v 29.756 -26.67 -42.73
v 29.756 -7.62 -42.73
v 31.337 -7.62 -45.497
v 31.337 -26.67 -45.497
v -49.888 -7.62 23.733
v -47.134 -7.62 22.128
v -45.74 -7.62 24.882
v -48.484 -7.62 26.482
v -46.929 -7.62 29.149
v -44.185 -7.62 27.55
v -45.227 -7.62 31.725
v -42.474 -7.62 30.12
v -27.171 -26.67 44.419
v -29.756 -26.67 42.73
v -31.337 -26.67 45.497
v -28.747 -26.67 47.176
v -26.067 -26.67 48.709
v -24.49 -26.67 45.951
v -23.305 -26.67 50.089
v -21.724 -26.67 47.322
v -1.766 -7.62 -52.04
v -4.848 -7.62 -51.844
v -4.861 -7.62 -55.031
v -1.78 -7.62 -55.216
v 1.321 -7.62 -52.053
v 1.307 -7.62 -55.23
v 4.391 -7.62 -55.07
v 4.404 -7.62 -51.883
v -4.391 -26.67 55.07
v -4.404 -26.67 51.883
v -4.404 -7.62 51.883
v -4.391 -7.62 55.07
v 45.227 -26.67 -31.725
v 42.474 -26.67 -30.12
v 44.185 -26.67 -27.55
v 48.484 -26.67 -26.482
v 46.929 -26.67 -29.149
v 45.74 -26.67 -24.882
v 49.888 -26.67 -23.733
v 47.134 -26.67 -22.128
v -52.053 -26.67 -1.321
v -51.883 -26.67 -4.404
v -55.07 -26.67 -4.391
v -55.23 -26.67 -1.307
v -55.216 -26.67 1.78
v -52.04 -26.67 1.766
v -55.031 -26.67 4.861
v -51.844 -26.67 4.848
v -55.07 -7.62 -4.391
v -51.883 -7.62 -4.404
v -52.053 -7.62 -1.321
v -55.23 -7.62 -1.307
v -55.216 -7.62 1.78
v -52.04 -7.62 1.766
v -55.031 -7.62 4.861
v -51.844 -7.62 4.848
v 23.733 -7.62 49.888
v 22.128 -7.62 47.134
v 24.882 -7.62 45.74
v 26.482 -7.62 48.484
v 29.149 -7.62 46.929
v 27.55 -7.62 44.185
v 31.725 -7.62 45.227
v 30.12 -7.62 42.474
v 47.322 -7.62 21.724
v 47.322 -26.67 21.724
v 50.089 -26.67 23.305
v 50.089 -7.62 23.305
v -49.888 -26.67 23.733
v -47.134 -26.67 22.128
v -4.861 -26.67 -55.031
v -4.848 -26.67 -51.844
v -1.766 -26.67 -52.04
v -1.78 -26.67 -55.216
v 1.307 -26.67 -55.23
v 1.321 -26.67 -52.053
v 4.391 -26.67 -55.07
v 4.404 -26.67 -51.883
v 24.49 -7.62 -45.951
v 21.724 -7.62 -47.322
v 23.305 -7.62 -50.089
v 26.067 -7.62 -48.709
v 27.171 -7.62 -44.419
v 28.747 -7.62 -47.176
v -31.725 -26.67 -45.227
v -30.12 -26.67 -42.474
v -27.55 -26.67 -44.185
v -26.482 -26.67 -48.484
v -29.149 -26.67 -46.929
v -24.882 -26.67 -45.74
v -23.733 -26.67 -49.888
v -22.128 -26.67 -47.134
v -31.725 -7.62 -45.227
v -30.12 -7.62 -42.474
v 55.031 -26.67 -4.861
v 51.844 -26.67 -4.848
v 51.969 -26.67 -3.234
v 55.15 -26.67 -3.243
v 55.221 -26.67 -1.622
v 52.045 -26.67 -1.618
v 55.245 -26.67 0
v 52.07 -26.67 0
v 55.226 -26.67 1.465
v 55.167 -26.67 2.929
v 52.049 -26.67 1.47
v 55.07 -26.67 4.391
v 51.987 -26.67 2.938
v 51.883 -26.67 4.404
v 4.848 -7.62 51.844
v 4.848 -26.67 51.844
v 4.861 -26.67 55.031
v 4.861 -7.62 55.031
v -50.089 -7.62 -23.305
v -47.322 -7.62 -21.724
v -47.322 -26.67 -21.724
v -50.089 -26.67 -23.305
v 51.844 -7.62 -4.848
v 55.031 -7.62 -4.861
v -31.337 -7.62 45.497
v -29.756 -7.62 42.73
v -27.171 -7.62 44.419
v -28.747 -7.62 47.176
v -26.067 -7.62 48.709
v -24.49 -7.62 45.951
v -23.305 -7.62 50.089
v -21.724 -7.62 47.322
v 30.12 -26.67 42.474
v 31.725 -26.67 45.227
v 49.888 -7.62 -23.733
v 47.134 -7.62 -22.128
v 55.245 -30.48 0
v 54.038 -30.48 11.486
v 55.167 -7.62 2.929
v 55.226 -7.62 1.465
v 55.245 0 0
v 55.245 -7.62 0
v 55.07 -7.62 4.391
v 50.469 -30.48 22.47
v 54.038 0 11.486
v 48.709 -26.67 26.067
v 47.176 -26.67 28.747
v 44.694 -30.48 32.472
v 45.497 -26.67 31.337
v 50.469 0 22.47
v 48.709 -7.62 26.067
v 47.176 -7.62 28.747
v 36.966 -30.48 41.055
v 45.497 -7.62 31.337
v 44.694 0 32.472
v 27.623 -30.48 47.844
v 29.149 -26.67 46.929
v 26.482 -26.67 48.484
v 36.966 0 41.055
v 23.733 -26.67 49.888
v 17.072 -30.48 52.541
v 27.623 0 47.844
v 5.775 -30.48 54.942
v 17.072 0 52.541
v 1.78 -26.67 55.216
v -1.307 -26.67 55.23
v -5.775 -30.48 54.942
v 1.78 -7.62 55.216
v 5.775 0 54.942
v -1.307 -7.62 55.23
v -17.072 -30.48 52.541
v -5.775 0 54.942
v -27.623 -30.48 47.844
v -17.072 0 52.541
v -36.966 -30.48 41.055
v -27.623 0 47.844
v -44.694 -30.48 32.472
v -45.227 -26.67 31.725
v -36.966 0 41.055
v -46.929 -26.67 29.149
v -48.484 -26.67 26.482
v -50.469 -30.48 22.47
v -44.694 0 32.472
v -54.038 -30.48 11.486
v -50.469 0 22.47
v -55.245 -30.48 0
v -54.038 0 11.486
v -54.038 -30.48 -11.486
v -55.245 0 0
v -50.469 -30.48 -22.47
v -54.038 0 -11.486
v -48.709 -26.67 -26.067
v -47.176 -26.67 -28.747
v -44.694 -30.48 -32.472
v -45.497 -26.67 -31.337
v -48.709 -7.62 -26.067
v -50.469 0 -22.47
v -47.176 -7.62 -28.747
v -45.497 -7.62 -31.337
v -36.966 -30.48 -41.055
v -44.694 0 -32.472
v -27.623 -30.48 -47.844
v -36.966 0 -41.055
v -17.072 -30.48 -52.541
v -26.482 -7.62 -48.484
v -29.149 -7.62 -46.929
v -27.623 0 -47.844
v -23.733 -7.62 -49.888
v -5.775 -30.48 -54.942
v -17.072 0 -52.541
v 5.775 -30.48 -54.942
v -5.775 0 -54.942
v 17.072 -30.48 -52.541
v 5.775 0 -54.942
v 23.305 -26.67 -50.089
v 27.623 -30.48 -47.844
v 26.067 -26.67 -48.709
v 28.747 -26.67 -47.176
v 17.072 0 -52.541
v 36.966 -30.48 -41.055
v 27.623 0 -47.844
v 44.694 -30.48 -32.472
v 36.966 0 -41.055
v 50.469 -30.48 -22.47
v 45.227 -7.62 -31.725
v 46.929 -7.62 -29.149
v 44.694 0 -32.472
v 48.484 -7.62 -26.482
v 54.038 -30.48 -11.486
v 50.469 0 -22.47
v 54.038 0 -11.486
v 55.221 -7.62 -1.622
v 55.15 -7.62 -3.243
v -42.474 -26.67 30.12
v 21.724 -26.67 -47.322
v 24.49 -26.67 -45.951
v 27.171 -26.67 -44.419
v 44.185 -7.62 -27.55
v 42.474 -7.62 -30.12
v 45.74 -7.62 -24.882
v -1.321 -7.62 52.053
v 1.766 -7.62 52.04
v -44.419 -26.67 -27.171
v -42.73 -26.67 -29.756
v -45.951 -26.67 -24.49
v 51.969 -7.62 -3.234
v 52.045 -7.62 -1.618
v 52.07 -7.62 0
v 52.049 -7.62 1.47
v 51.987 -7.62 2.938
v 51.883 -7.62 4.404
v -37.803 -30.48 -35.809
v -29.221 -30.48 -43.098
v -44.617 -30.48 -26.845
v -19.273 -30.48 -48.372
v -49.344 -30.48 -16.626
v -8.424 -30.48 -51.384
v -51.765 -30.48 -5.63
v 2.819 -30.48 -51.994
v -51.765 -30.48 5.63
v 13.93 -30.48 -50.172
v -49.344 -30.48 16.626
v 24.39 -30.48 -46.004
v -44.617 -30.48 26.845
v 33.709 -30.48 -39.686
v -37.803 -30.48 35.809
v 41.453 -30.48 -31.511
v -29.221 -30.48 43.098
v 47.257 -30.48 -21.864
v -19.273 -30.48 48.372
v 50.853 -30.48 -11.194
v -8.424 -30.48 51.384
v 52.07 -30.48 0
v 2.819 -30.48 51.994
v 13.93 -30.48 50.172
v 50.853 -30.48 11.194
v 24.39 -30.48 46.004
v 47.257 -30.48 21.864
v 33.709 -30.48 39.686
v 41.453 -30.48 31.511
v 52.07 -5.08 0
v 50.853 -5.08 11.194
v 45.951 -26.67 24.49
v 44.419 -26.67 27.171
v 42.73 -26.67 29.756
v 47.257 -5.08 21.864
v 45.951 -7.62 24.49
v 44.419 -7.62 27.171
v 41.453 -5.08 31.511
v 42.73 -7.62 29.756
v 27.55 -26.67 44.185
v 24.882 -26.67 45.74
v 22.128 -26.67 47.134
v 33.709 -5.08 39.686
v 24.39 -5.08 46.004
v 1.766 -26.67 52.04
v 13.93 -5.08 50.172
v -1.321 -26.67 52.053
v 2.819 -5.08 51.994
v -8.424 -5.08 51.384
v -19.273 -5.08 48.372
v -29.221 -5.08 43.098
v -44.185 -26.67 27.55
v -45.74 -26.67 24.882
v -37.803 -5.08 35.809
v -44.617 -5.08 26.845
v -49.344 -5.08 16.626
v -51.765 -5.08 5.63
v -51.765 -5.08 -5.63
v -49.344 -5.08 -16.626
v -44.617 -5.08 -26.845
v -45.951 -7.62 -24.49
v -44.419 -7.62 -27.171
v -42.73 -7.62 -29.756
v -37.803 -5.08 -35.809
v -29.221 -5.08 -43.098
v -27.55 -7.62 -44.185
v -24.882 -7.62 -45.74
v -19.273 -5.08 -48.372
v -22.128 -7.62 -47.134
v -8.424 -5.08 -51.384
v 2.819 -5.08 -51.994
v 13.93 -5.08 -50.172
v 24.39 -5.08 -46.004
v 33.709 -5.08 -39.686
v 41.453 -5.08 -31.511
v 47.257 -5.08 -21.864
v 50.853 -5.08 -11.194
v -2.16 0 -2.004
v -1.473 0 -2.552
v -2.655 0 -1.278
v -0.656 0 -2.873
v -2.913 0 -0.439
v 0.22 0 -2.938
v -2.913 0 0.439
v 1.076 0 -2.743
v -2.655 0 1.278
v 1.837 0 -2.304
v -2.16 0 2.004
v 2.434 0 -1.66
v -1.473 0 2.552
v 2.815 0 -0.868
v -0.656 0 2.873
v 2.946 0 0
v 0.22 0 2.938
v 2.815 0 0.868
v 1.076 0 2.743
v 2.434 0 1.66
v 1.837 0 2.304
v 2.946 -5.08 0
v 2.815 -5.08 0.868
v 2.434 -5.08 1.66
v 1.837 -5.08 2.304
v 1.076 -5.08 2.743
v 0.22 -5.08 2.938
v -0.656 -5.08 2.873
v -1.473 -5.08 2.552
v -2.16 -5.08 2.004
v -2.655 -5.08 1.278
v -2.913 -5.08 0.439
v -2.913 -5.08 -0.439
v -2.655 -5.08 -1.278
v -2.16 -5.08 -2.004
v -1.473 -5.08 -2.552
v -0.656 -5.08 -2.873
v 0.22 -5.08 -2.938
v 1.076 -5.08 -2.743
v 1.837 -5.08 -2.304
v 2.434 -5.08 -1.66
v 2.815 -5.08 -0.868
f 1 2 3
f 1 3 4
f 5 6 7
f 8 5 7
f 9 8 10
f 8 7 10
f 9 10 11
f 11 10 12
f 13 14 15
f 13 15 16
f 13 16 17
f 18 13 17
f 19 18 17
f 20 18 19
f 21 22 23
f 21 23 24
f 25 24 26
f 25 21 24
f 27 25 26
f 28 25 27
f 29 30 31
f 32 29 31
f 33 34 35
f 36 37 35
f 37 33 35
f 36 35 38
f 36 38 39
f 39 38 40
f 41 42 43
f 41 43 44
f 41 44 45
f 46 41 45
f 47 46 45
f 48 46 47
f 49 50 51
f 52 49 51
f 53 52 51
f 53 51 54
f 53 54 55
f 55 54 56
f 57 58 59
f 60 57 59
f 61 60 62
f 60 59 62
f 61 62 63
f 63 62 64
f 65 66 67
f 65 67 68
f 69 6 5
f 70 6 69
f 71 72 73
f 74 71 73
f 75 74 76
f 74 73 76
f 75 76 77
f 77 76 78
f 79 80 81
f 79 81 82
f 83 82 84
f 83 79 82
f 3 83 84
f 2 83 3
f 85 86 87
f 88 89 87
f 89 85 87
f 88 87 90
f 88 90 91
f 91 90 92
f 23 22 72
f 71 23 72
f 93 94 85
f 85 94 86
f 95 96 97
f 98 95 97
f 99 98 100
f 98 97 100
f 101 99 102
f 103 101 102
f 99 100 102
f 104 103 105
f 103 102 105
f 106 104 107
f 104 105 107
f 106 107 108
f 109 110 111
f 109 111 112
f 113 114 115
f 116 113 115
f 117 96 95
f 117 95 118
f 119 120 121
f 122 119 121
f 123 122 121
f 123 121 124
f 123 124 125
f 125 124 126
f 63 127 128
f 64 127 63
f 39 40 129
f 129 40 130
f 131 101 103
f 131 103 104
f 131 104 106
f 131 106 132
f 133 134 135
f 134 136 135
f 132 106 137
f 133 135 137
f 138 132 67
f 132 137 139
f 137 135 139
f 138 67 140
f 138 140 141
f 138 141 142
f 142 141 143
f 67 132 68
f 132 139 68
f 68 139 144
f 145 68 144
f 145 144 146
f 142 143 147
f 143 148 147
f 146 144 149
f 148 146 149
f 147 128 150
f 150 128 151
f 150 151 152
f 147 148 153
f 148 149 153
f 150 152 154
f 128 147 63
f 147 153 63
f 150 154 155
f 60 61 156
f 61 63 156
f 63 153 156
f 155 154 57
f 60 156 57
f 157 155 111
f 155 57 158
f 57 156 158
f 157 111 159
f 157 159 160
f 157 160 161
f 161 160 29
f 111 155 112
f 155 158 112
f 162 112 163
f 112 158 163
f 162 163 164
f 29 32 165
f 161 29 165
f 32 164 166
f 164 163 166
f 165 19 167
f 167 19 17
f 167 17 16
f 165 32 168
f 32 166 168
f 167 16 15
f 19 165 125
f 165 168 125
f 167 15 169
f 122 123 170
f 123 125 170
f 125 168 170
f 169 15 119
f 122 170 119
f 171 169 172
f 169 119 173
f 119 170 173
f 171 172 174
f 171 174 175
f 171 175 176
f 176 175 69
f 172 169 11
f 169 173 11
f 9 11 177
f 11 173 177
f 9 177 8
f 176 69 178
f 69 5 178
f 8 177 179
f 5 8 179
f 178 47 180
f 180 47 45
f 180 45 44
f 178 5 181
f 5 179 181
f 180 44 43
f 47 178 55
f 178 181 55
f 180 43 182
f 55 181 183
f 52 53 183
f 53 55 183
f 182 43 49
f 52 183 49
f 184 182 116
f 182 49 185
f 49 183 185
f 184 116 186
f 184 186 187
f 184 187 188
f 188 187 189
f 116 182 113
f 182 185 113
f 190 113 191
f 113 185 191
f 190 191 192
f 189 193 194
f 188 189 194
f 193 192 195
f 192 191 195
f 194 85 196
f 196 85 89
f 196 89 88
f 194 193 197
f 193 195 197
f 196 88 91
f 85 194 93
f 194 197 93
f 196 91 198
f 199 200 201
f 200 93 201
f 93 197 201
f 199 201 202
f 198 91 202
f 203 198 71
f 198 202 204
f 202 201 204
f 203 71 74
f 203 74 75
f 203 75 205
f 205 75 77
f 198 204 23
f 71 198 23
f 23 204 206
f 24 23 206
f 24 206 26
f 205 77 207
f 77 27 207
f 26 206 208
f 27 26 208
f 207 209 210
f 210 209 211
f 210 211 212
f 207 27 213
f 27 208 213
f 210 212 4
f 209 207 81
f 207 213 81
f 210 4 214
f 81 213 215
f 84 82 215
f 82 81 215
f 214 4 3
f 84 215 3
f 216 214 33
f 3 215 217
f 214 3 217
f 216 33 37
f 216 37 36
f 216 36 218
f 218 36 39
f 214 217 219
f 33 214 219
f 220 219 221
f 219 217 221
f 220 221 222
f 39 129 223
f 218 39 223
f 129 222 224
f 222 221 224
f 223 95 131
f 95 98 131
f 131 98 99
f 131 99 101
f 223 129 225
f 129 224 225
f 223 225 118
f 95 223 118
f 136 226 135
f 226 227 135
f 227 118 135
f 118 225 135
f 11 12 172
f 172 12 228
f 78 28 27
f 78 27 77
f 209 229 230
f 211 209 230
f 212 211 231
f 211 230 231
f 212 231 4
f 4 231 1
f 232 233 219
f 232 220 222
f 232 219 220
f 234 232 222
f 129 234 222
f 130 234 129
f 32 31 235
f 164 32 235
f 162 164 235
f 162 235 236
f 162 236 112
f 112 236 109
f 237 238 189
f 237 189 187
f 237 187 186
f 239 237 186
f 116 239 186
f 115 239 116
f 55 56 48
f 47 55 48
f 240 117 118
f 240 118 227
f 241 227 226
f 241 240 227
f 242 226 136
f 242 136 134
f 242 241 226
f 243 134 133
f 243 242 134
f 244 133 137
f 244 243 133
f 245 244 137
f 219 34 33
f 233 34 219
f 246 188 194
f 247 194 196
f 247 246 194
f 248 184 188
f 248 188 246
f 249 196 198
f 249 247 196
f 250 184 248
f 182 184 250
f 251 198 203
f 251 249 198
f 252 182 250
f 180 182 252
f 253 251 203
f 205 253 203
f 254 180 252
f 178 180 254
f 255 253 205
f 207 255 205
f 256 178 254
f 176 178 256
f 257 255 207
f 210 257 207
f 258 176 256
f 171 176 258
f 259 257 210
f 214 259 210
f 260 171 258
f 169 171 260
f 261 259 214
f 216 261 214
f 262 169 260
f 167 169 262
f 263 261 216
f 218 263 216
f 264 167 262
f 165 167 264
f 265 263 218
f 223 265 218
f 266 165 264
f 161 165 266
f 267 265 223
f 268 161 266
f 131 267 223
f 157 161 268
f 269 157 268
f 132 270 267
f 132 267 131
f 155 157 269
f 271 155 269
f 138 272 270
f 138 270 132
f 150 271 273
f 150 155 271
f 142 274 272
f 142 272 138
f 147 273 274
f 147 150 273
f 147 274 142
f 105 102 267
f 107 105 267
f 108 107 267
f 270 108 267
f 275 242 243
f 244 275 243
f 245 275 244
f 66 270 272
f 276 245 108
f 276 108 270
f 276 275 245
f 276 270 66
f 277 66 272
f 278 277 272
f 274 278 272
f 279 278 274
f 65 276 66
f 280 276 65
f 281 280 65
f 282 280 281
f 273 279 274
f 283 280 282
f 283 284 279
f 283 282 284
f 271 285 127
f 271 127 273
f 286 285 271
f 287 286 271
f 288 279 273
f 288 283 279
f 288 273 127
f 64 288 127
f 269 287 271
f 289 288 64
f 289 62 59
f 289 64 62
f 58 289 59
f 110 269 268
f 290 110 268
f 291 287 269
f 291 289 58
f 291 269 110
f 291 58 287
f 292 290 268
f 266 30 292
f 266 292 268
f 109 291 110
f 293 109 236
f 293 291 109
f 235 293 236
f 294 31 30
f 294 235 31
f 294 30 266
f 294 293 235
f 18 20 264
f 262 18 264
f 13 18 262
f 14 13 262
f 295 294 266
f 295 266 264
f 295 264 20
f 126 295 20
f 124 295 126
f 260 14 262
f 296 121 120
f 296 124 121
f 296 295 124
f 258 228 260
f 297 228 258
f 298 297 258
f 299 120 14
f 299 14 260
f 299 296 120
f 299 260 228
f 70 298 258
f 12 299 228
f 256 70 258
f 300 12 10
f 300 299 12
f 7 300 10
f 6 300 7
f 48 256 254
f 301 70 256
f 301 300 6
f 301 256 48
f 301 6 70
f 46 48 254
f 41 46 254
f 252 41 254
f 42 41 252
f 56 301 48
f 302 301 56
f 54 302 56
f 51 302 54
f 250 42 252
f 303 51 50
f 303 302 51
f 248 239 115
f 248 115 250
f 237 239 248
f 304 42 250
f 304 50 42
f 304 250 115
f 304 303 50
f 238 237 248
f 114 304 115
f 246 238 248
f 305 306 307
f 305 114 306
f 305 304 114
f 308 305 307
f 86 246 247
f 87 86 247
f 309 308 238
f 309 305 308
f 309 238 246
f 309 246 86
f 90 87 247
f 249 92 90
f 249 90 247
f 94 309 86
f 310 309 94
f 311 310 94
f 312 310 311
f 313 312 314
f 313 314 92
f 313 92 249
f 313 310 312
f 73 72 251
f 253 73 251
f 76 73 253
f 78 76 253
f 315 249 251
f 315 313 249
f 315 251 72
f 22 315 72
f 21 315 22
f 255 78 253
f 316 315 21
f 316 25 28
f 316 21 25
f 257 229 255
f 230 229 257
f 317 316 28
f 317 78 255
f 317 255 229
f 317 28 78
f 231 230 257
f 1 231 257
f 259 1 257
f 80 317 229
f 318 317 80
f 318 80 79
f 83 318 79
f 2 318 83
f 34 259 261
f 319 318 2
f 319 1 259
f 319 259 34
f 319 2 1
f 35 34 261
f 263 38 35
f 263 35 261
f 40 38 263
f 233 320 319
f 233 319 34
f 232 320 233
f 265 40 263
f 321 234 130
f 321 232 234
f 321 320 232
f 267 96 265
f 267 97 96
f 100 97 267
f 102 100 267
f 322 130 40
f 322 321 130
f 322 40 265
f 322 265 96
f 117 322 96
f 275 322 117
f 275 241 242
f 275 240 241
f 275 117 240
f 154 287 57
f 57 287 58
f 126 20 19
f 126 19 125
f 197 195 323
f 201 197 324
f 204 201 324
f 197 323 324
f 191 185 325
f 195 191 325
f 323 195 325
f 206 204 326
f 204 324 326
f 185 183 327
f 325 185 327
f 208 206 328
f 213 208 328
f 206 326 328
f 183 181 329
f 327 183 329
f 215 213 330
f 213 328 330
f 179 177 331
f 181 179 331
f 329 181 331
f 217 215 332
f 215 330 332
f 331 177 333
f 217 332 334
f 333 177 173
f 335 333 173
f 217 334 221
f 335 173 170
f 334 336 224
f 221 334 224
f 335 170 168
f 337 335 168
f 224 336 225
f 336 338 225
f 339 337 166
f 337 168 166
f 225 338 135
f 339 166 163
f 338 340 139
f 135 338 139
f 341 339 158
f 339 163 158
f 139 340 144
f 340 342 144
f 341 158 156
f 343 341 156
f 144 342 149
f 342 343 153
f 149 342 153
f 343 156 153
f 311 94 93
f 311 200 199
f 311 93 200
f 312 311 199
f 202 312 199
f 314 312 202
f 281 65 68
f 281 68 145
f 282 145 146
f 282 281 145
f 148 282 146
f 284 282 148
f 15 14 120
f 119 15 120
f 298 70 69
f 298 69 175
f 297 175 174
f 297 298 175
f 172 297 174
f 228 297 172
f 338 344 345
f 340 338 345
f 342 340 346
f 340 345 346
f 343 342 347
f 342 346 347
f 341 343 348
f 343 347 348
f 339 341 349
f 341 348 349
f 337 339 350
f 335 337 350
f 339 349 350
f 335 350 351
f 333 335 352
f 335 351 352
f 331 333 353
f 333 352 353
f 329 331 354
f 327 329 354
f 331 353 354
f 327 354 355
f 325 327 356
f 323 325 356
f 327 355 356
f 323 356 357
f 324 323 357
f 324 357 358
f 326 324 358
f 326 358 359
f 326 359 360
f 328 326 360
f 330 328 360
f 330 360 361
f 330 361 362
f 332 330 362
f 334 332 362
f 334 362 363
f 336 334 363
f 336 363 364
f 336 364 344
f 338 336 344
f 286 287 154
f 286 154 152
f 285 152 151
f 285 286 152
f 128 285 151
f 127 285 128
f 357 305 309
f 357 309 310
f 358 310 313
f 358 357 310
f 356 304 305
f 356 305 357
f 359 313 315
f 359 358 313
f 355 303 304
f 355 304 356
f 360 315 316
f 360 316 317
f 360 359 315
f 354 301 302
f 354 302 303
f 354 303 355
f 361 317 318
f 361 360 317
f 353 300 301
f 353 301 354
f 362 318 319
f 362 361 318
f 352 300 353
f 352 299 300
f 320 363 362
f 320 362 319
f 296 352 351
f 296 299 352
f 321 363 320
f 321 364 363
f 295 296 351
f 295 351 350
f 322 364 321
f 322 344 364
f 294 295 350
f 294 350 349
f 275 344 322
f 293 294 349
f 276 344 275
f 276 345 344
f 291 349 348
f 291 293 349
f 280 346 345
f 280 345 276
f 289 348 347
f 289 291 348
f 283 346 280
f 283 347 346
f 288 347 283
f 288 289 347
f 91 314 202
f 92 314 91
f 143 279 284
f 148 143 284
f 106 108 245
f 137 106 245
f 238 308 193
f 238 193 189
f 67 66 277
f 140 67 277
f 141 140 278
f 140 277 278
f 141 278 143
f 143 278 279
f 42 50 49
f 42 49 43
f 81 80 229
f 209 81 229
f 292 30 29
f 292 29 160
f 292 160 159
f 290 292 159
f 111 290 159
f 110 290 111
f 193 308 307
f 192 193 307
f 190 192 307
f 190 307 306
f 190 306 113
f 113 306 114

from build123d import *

# Parameters (mm, degrees)
F0_R      = 52.07
F1_DEPTH  = 5.08
F0_R_2    = 55.245
F2_DEPTH  = 30.48
F4_DEPTH  = 21.59
F5_W      = 9.2520020868
F5_H      = 19.05
F6_DEPTH  = 50.8
F7_W      = 9.2520020868
F7_H      = 19.05
F8_DEPTH  = 50.8
F9_W      = 9.2520020868
F9_H      = 19.05
F10_DEPTH = 50.8
F11_W     = 19.05
F11_H     = 9.2520020868
F12_DEPTH = 50.8
F13_W     = 19.05
F13_H     = 9.2520020868
F14_DEPTH = 50.8
F15_W     = 19.05
F15_H     = 9.2520020868
F16_DEPTH = 50.8
F17_W     = 9.2520020868
F17_H     = 19.05
F18_DEPTH = 50.8
F19_W     = 9.2520020868
F19_H     = 19.05
F20_DEPTH = 50.8
F21_W     = 9.2520020868
F21_H     = 19.05
F22_DEPTH = 50.8
F23_W     = 19.05
F23_H     = 9.2520020868
F24_DEPTH = 50.8
F25_W     = 19.05
F25_H     = 9.2520020868
F26_DEPTH = 50.8
F27_W     = 19.05
F27_H     = 9.2520020868
F28_DEPTH = 50.8
F29_DEPTH = 21.59
F30_R     = 2.9464
F31_DEPTH = 8.382


with BuildPart() as f1:
    # F0 (on Front) → F1 (new body)
    with BuildSketch(Plane.XZ):
        Circle(F0_R)
    extrude(amount=F1_DEPTH)

    # F0 (on Front) → F2 (join)
    with BuildSketch(Plane.XZ):
        Circle(F0_R_2)
        Circle(F0_R, mode=Mode.SUBTRACT)
    extrude(amount=F2_DEPTH)

    # F3 (on face) → F4 (join)
    with BuildSketch(Plane.XZ.offset(5.08)):
        Polygon((4.5521322669, -17.2840948262), (12.5843095976, -12.6923990675), (17.2445313344, -4.6997852286), (17.2840948262, 4.5521322669), (12.6923990675, 12.5843095976), (4.6997852286, 17.2445313344), (-4.5521322669, 17.2840948262), (-12.5843095976, 12.6923990675), (-17.2445313344, 4.6997852286), (-17.2840948262, -4.5521322669), (-12.6923990675, -12.5843095976), (-4.6997852286, -17.2445313344), align=None)
    extrude(amount=F4_DEPTH)

    # F5 (on face) → F6 (cut)
    with BuildSketch(Plane(origin=(8.696092148, 0, 14.914420466), x_dir=(0.8638793813, 0, -0.5036987339), z_dir=(0.5036987339, 0, 0.8638793813))):
        with Locations((0, -17.145)):
            Rectangle(F5_W, F5_H)
    extrude(amount=F6_DEPTH, mode=Mode.SUBTRACT)

    # F7 (on face) → F8 (cut)
    with BuildSketch(Plane(origin=(0.0738264808, 0, 17.2643130803), x_dir=(0.999990857, 0, -0.0042762087), z_dir=(0.0042762087, 0, 0.999990857))):
        with Locations((0, -17.145)):
            Rectangle(F7_W, F7_H)
    extrude(amount=F8_DEPTH, mode=Mode.SUBTRACT)

    # F9 (on face) → F10 (cut)
    with BuildSketch(Plane(origin=(-8.5682209323, 0, 14.9882469469), x_dir=(0.86815559, 0, 0.4962921231), z_dir=(-0.4962921231, 0, 0.86815559))):
        with Locations((0, -17.145)):
            Rectangle(F9_W, F9_H)
    extrude(amount=F10_DEPTH, mode=Mode.SUBTRACT)

    # F11 (on face) → F12 (cut)
    with BuildSketch(Plane(origin=(-14.914420466, 0, 8.696092148), x_dir=(0, -1, 0), z_dir=(-0.8638793813, 0, 0.5036987339))):
        with Locations((17.145, 0)):
            Rectangle(F11_W, F11_H)
    extrude(amount=F12_DEPTH, mode=Mode.SUBTRACT)

    # F13 (on face) → F14 (cut)
    with BuildSketch(Plane(origin=(-17.2643130803, 0, 0.0738264808), x_dir=(0, -1, 0), z_dir=(-0.999990857, 0, 0.0042762087))):
        with Locations((17.145, 0)):
            Rectangle(F13_W, F13_H)
    extrude(amount=F14_DEPTH, mode=Mode.SUBTRACT)

    # F15 (on face) → F16 (cut)
    with BuildSketch(Plane(origin=(-14.9882469469, 0, -8.5682209323), x_dir=(0, -1, 0), z_dir=(-0.86815559, 0, -0.4962921231))):
        with Locations((17.145, 0)):
            Rectangle(F15_W, F15_H)
    extrude(amount=F16_DEPTH, mode=Mode.SUBTRACT)

    # F17 (on face) → F18 (cut)
    with BuildSketch(Plane(origin=(-8.696092148, 0, -14.914420466), x_dir=(0.8638793813, 0, -0.5036987339), z_dir=(-0.5036987339, 0, -0.8638793813))):
        with Locations((0, 17.145)):
            Rectangle(F17_W, F17_H)
    extrude(amount=F18_DEPTH, mode=Mode.SUBTRACT)

    # F19 (on face) → F20 (cut)
    with BuildSketch(Plane(origin=(-0.0738264808, 0, -17.2643130803), x_dir=(0.999990857, 0, -0.0042762087), z_dir=(-0.0042762087, 0, -0.999990857))):
        with Locations((0, 17.145)):
            Rectangle(F19_W, F19_H)
    extrude(amount=F20_DEPTH, mode=Mode.SUBTRACT)

    # F21 (on face) → F22 (cut)
    with BuildSketch(Plane(origin=(8.5682209323, 0, -14.9882469469), x_dir=(0.86815559, 0, 0.4962921231), z_dir=(0.4962921231, 0, -0.86815559))):
        with Locations((0, 17.145)):
            Rectangle(F21_W, F21_H)
    extrude(amount=F22_DEPTH, mode=Mode.SUBTRACT)

    # F23 (on face) → F24 (cut)
    with BuildSketch(Plane(origin=(14.914420466, 0, -8.696092148), x_dir=(0, 1, 0), z_dir=(0.8638793813, 0, -0.5036987339))):
        with Locations((-17.145, 0)):
            Rectangle(F23_W, F23_H)
    extrude(amount=F24_DEPTH, mode=Mode.SUBTRACT)

    # F25 (on face) → F26 (cut)
    with BuildSketch(Plane(origin=(17.2643130803, 0, -0.0738264808), x_dir=(0, 1, 0), z_dir=(0.999990857, 0, -0.0042762087))):
        with Locations((-17.145, 0)):
            Rectangle(F25_W, F25_H)
    extrude(amount=F26_DEPTH, mode=Mode.SUBTRACT)

    # F27 (on face) → F28 (cut)
    with BuildSketch(Plane(origin=(14.9882469469, 0, 8.5682209323), x_dir=(0, 1, 0), z_dir=(0.86815559, 0, 0.4962921231))):
        with Locations((-17.145, 0)):
            Rectangle(F27_W, F27_H)
    extrude(amount=F28_DEPTH, mode=Mode.SUBTRACT)

    # F29 (cut): a face of the model
    f29_faces = [f1.faces().sort_by_distance(p)[0] for p in [
        (0, -26.67, 0),
    ]]
    extrude(f29_faces, amount=-F29_DEPTH, mode=Mode.SUBTRACT)

    # F30 (on face) → F31 (cut)
    with BuildSketch(Plane.XZ.offset(5.08)):
        Circle(F30_R)
    extrude(amount=-F31_DEPTH, mode=Mode.SUBTRACT)


solid = f1.part
